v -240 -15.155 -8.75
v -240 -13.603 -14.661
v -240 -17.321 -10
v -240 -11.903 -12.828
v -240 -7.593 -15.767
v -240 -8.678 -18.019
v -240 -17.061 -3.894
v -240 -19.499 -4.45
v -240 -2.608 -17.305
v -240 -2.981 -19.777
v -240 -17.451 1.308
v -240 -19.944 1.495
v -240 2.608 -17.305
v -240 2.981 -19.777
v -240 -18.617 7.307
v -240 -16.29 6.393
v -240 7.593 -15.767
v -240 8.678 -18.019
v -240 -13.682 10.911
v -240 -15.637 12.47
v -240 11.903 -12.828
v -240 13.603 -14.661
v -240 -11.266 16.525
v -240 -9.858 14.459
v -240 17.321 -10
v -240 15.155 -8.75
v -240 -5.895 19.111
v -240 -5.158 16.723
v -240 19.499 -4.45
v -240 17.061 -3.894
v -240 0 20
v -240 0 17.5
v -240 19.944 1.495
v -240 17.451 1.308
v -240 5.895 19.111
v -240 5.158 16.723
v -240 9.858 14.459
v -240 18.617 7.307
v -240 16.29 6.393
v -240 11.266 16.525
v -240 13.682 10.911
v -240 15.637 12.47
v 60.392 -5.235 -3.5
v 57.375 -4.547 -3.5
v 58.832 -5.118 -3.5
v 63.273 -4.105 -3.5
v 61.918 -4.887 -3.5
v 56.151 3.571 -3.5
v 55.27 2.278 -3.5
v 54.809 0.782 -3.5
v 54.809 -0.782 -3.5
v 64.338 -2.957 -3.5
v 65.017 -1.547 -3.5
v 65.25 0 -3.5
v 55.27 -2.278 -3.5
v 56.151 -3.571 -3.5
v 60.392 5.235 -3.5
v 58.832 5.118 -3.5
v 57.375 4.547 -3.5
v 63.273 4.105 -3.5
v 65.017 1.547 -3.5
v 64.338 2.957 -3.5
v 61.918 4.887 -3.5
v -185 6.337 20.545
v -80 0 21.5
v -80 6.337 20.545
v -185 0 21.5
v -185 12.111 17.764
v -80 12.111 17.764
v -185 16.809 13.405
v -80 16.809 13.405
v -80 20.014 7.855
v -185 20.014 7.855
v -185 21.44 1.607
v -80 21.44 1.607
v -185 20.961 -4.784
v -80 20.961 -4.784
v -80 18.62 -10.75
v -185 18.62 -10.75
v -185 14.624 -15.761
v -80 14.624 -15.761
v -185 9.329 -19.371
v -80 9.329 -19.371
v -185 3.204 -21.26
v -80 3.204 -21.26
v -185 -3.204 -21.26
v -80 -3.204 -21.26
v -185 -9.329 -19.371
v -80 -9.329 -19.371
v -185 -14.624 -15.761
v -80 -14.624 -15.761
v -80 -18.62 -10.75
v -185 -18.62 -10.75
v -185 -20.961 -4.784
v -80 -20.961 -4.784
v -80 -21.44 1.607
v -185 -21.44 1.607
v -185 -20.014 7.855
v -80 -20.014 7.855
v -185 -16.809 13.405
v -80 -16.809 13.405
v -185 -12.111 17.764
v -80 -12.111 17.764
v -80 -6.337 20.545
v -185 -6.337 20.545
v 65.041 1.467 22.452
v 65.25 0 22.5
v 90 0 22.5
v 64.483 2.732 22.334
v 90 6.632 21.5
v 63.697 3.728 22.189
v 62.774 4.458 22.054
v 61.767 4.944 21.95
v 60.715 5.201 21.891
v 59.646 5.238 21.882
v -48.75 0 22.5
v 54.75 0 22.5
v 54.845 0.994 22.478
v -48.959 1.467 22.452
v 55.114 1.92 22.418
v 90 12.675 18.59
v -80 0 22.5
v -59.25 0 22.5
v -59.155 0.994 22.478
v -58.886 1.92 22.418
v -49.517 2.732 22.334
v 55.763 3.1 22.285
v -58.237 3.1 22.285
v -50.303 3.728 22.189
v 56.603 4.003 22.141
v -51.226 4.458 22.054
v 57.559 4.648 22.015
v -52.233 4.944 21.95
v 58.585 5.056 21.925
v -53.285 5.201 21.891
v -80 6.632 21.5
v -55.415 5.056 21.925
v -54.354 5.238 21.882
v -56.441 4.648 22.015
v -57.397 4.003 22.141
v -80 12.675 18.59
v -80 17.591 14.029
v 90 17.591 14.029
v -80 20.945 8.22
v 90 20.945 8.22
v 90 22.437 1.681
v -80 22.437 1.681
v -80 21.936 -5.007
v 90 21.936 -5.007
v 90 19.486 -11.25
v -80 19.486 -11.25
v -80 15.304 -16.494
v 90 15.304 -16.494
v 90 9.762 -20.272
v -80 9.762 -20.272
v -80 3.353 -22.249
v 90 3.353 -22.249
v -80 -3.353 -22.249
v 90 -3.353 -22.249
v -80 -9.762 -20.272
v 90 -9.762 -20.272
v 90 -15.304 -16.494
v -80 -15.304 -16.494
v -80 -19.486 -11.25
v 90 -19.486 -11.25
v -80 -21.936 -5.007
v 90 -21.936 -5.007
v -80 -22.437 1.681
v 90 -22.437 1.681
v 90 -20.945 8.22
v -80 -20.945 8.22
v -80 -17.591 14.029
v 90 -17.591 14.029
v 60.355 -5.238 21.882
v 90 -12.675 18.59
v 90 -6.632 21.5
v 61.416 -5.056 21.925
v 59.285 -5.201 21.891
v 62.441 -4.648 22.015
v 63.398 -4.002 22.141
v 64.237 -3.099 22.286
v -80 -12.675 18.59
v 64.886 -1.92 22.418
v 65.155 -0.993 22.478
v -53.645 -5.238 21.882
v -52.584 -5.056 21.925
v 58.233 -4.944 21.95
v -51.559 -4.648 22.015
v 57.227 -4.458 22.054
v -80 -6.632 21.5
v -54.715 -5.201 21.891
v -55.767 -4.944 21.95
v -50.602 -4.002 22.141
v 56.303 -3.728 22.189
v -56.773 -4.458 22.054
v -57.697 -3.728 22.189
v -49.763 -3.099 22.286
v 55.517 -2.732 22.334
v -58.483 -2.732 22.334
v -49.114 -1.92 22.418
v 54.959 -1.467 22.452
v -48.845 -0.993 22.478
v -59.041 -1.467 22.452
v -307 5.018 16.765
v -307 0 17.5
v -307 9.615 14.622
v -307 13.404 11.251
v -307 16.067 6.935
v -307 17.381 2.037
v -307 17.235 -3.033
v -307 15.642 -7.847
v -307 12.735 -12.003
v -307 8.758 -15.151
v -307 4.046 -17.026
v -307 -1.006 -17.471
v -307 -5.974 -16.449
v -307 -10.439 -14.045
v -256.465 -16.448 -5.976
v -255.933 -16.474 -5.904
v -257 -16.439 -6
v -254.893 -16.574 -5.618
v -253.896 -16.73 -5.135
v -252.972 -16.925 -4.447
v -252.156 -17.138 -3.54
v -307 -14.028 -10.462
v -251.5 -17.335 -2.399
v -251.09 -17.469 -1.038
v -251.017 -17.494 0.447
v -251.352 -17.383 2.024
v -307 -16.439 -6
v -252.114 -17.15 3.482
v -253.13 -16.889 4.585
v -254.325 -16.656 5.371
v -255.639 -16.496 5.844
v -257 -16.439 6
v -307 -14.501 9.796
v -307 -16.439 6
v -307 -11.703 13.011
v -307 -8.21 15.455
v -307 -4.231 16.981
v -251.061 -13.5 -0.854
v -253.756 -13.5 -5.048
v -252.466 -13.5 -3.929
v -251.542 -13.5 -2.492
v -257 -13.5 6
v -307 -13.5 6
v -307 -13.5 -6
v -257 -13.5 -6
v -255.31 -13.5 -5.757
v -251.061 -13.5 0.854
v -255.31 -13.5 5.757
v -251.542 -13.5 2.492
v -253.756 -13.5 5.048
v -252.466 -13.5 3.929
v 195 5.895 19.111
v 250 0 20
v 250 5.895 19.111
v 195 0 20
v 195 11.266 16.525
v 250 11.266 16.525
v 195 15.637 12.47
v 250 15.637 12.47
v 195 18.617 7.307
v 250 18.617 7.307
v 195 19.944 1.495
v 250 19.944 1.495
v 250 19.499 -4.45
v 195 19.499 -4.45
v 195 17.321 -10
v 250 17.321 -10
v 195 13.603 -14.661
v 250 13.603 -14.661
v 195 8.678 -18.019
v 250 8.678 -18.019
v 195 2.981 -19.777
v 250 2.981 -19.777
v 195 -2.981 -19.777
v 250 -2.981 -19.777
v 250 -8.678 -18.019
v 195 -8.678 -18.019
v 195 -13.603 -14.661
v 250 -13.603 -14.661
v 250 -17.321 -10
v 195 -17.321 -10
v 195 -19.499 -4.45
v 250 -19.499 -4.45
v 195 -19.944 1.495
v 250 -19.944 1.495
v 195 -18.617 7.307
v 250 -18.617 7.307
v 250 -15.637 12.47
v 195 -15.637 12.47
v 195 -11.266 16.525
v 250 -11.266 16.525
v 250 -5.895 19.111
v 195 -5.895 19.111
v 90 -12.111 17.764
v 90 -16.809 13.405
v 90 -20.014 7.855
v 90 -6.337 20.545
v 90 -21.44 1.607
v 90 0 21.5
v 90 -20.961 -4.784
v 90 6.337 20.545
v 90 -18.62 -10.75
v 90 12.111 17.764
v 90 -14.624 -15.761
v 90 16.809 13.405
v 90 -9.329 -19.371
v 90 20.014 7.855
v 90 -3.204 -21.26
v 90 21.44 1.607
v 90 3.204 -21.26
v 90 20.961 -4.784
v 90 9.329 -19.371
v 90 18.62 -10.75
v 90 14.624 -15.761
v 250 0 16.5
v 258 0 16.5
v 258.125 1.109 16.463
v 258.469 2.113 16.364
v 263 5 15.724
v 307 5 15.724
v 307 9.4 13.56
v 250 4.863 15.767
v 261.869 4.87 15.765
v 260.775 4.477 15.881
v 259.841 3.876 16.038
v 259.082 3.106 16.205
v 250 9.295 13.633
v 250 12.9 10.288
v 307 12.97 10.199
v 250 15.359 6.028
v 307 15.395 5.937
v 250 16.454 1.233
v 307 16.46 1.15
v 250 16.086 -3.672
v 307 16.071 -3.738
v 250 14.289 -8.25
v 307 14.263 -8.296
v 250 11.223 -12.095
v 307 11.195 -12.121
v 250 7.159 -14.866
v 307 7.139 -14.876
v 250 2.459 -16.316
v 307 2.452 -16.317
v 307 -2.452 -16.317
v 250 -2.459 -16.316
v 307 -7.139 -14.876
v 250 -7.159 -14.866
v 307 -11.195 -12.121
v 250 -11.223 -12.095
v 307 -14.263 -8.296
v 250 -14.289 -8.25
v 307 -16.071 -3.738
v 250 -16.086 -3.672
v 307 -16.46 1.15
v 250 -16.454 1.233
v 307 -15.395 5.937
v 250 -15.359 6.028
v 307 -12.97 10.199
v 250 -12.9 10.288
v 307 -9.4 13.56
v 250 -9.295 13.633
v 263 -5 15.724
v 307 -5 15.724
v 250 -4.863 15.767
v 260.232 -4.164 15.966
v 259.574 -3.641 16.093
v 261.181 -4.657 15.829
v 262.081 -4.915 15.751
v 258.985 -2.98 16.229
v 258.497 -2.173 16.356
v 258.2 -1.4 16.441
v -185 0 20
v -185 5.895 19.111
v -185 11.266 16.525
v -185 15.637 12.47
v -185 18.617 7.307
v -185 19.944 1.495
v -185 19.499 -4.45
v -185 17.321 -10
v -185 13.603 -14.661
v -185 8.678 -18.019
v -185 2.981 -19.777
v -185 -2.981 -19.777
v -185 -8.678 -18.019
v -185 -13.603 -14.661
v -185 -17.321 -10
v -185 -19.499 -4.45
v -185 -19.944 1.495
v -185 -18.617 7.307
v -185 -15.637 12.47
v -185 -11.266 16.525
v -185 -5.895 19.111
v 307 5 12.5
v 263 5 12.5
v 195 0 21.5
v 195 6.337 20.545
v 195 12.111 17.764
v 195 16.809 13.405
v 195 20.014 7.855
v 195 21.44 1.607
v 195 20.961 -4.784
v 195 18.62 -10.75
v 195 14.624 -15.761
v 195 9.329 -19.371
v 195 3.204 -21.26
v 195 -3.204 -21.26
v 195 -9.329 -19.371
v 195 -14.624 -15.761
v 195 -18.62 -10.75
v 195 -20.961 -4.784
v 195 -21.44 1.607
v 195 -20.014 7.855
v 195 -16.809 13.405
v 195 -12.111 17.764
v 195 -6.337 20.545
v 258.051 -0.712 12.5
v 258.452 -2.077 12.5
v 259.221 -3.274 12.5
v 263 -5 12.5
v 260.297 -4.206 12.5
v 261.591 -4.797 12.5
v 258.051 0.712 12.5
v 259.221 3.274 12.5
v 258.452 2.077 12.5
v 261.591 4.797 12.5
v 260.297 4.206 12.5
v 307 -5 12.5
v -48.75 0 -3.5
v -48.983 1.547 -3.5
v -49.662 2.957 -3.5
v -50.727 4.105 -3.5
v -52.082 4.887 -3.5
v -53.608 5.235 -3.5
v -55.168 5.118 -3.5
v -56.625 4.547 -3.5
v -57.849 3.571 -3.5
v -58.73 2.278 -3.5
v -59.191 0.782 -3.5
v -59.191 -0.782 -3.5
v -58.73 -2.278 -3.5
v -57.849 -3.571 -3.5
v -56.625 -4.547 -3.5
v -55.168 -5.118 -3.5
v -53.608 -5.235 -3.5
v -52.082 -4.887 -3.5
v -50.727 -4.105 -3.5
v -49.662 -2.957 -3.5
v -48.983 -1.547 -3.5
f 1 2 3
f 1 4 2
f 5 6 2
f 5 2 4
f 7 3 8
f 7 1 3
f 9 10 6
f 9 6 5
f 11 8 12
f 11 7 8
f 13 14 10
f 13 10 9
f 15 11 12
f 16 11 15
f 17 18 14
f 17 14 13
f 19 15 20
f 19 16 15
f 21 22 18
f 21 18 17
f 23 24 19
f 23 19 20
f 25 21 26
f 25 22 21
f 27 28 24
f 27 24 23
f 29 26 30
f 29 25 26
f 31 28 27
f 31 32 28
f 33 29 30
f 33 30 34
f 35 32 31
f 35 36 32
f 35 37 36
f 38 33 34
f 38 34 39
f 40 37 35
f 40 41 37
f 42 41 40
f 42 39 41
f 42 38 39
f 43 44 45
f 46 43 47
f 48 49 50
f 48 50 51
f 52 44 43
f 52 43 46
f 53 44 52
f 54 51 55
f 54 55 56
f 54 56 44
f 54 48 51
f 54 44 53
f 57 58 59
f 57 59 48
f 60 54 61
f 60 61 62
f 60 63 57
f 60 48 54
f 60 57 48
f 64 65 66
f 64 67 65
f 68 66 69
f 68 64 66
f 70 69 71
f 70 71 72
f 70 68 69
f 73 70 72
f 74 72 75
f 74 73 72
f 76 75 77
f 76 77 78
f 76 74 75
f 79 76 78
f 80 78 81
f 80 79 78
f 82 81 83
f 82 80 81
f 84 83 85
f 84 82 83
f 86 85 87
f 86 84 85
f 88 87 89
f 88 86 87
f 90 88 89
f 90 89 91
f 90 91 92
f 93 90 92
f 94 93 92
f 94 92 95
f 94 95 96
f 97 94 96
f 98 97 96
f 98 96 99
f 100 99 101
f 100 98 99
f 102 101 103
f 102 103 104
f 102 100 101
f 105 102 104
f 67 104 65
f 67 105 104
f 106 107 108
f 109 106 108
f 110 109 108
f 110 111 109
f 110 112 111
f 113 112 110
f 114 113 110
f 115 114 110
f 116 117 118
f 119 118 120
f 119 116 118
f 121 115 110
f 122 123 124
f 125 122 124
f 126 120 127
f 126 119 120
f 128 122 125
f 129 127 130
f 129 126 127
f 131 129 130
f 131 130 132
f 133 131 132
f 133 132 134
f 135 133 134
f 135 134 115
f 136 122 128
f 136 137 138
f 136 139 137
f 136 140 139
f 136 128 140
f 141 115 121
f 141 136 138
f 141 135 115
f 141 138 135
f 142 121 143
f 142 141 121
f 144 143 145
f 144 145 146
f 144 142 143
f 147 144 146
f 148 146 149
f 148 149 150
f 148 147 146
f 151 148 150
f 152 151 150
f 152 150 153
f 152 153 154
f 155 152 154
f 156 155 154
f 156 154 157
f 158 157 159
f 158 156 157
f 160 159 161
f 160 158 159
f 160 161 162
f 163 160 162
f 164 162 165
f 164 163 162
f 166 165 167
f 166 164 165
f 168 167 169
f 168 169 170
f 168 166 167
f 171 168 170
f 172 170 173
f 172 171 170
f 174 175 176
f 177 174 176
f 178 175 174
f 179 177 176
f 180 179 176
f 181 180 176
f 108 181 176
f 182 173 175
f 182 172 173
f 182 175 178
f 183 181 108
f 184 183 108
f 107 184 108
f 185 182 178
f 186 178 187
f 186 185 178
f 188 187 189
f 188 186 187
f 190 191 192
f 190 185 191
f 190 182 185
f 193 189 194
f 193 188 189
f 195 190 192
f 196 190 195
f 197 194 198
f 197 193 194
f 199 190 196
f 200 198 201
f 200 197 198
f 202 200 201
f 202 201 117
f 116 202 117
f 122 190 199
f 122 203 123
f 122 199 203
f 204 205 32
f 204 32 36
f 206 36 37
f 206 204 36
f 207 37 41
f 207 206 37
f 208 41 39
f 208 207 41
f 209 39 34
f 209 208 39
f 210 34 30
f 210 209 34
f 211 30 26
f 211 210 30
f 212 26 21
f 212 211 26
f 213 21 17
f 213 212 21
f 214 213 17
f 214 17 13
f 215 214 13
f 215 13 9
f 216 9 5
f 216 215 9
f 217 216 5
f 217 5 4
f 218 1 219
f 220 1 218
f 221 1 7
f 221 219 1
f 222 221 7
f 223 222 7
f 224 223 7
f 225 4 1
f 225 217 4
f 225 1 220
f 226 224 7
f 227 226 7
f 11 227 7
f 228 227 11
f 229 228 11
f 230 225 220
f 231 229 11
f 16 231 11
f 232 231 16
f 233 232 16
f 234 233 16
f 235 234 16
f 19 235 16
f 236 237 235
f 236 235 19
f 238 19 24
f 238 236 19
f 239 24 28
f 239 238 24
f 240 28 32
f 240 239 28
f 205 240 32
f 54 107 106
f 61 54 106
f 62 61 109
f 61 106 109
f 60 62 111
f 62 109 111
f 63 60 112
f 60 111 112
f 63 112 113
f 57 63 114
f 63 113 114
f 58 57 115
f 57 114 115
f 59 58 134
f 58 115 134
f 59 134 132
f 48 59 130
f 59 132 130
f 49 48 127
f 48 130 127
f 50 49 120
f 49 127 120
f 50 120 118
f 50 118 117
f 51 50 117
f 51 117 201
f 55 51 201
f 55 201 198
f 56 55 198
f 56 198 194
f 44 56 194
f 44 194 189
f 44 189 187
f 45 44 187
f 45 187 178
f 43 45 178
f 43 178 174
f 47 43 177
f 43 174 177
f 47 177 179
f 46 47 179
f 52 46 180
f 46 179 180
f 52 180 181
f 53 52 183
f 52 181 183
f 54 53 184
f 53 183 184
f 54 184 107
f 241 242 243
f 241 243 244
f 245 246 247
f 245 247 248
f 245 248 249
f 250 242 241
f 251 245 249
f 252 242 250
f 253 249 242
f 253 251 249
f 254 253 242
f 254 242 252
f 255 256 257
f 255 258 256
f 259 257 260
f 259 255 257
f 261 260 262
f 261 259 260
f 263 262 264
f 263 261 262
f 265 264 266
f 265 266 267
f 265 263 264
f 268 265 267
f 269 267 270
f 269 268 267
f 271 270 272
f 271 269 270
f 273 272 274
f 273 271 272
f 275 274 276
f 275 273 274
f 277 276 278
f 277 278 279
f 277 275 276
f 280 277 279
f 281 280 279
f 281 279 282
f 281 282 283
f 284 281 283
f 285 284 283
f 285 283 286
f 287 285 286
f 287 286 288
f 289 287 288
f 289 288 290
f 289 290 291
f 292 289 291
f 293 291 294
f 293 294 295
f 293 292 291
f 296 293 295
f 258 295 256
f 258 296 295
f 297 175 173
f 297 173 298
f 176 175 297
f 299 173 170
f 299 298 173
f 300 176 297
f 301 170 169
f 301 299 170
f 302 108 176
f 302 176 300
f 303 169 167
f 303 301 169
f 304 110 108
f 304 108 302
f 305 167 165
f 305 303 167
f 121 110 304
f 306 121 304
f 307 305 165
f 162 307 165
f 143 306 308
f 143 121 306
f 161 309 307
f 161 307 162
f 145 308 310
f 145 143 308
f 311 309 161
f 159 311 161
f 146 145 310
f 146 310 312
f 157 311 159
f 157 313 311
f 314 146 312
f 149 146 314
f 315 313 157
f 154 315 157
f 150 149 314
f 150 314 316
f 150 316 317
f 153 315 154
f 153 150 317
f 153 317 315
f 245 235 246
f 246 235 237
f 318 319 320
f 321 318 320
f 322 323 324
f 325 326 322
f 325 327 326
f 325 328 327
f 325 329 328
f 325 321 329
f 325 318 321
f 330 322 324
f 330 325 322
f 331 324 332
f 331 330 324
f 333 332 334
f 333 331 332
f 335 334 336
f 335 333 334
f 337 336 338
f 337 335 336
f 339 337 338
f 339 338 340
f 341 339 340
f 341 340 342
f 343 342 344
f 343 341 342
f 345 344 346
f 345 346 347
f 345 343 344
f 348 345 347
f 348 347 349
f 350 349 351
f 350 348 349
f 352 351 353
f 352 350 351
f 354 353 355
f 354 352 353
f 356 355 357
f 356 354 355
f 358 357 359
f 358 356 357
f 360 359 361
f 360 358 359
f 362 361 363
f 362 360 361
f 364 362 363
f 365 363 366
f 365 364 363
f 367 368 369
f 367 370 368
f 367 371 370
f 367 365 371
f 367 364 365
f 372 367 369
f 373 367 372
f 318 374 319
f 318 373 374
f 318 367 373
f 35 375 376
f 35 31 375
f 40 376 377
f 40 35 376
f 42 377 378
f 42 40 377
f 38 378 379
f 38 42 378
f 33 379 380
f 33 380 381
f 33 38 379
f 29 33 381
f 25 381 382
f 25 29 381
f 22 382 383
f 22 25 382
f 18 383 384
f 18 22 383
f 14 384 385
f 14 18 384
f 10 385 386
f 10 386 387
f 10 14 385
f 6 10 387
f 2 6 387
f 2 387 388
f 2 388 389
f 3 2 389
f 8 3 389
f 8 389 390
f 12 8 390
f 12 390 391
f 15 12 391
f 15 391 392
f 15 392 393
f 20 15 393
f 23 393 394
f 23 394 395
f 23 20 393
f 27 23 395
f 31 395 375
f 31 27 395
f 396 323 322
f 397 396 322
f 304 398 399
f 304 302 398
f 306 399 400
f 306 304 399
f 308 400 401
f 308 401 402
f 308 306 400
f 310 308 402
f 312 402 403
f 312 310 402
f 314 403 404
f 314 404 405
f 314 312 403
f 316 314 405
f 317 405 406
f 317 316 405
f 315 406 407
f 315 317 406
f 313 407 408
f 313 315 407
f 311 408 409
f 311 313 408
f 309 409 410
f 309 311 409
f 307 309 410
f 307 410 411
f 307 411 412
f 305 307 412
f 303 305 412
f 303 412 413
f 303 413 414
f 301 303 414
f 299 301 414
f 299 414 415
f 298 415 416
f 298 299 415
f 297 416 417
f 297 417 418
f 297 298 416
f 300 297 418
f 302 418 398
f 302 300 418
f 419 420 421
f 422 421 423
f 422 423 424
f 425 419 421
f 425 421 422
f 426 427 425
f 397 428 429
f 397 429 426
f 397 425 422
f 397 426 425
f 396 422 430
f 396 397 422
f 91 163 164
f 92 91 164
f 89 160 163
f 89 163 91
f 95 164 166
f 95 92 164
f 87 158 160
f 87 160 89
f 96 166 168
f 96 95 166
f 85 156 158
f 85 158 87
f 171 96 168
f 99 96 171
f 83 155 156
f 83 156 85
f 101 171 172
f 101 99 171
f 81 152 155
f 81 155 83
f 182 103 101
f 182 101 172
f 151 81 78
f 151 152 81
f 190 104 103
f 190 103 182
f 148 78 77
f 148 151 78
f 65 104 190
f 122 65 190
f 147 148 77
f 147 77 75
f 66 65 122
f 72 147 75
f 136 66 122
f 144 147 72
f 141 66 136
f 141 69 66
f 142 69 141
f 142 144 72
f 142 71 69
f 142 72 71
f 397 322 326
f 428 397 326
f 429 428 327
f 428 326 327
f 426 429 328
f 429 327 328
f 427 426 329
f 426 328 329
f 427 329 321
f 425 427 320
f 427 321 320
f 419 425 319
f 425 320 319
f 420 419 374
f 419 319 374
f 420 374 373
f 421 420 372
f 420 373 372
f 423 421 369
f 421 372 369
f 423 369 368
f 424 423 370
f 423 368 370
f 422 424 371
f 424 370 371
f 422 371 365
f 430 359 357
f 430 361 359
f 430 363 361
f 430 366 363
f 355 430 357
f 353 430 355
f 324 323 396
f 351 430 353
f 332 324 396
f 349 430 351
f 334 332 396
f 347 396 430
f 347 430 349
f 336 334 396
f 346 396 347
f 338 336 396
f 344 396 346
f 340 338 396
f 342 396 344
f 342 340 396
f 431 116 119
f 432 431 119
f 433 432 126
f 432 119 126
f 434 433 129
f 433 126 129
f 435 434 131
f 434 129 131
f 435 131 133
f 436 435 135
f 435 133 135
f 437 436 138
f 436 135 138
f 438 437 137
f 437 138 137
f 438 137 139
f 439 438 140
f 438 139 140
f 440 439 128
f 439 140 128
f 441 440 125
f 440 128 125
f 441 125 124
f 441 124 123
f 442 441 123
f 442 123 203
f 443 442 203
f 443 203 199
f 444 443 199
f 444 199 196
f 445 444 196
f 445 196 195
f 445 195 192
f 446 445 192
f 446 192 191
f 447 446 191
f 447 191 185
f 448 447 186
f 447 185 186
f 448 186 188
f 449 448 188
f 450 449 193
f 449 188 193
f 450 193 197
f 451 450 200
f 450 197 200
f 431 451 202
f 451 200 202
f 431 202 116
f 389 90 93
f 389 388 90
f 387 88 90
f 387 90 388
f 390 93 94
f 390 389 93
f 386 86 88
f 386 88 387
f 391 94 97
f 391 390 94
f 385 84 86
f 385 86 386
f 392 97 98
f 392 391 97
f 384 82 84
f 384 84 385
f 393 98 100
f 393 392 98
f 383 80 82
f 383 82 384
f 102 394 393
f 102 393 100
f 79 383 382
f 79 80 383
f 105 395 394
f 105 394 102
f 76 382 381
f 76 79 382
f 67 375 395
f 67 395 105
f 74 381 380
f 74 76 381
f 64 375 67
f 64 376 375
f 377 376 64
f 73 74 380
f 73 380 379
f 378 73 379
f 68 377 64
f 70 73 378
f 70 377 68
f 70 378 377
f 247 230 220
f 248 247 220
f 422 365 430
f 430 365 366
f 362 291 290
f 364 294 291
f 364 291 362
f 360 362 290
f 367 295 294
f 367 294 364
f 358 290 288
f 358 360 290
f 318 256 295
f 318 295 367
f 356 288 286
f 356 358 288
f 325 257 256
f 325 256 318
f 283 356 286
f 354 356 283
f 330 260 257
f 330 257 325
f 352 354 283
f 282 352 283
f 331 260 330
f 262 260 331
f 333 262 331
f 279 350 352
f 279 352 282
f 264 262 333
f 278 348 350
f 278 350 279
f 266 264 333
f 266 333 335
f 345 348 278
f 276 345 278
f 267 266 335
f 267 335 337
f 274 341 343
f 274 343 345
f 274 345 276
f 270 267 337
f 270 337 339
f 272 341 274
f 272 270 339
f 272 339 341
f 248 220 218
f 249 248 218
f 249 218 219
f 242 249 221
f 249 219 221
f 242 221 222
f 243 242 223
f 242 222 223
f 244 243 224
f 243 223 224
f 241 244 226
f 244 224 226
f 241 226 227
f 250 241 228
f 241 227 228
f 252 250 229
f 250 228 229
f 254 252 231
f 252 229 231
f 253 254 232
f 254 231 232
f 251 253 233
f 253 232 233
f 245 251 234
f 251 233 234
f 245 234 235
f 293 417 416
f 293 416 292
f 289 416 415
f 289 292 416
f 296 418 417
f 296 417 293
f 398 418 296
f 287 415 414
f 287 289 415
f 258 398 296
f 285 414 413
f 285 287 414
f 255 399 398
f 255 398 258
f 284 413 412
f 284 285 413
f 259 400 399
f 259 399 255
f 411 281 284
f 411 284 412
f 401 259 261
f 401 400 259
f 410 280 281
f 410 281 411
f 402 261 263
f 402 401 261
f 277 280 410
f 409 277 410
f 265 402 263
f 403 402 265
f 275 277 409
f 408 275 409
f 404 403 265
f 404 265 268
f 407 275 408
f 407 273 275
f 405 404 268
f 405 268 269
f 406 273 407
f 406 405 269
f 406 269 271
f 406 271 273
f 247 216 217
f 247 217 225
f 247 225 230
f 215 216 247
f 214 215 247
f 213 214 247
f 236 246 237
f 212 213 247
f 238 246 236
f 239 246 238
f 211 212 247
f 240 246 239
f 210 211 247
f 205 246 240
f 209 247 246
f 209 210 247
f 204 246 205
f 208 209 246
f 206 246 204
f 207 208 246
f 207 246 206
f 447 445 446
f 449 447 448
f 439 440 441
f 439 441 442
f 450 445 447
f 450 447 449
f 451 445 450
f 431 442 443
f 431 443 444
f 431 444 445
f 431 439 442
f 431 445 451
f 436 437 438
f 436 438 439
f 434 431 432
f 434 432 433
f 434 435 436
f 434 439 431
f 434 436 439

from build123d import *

# Parameters (mm, degrees)
F4_DEPTH  = 4
F7_DEPTH  = 4
F9_R      = 5.25
F10_DEPTH = 26


with BuildPart() as f1:
    # F0 (on Front) → F1 (revolve)
    with BuildSketch(Plane.XZ):
        Polygon((-307, 17.5), (-307, 0), (307, 0), (307, 16.5), (250, 16.5), (250, 20), (195, 20), (195, 21.5), (90, 21.5), (90, 22.5), (-80, 22.5), (-80, 21.5), (-185, 21.5), (-185, 20), (-240, 20), (-240, 17.5), align=None)
    revolve(axis=Axis((0, 0, 0), (-1, 0, 0)))

    # F3 (on offset) → F4 (cut)
    with BuildSketch(Plane.XZ.offset(17.5)):
        with BuildLine():
            Line((-257, 6), (-307, 6))
            Line((-307, 6), (-307, -6))
            Line((-307, -6), (-257, -6))
            ThreePointArc((-257, -6), (-251, 0), (-257, 6))
        make_face()
    extrude(amount=-F4_DEPTH, mode=Mode.SUBTRACT)

    # F6 (on offset) → F7 (cut)
    with BuildSketch(Plane.XY.offset(16.5)):
        with BuildLine():
            Line((307, -5), (307, 5))
            Line((307, 5), (263, 5))
            ThreePointArc((263, 5), (258, 0), (263, -5))
            Line((263, -5), (307, -5))
        make_face()
    extrude(amount=-F7_DEPTH, mode=Mode.SUBTRACT)

    # F9 (on offset) → F10 (cut)
    with BuildSketch(Plane.XY.offset(22.5)):
        with Locations((-54, 0)):
            Circle(F9_R)
        with Locations((60, 0)):
            Circle(F9_R)
    extrude(amount=-F10_DEPTH, mode=Mode.SUBTRACT)


solid = f1.part
